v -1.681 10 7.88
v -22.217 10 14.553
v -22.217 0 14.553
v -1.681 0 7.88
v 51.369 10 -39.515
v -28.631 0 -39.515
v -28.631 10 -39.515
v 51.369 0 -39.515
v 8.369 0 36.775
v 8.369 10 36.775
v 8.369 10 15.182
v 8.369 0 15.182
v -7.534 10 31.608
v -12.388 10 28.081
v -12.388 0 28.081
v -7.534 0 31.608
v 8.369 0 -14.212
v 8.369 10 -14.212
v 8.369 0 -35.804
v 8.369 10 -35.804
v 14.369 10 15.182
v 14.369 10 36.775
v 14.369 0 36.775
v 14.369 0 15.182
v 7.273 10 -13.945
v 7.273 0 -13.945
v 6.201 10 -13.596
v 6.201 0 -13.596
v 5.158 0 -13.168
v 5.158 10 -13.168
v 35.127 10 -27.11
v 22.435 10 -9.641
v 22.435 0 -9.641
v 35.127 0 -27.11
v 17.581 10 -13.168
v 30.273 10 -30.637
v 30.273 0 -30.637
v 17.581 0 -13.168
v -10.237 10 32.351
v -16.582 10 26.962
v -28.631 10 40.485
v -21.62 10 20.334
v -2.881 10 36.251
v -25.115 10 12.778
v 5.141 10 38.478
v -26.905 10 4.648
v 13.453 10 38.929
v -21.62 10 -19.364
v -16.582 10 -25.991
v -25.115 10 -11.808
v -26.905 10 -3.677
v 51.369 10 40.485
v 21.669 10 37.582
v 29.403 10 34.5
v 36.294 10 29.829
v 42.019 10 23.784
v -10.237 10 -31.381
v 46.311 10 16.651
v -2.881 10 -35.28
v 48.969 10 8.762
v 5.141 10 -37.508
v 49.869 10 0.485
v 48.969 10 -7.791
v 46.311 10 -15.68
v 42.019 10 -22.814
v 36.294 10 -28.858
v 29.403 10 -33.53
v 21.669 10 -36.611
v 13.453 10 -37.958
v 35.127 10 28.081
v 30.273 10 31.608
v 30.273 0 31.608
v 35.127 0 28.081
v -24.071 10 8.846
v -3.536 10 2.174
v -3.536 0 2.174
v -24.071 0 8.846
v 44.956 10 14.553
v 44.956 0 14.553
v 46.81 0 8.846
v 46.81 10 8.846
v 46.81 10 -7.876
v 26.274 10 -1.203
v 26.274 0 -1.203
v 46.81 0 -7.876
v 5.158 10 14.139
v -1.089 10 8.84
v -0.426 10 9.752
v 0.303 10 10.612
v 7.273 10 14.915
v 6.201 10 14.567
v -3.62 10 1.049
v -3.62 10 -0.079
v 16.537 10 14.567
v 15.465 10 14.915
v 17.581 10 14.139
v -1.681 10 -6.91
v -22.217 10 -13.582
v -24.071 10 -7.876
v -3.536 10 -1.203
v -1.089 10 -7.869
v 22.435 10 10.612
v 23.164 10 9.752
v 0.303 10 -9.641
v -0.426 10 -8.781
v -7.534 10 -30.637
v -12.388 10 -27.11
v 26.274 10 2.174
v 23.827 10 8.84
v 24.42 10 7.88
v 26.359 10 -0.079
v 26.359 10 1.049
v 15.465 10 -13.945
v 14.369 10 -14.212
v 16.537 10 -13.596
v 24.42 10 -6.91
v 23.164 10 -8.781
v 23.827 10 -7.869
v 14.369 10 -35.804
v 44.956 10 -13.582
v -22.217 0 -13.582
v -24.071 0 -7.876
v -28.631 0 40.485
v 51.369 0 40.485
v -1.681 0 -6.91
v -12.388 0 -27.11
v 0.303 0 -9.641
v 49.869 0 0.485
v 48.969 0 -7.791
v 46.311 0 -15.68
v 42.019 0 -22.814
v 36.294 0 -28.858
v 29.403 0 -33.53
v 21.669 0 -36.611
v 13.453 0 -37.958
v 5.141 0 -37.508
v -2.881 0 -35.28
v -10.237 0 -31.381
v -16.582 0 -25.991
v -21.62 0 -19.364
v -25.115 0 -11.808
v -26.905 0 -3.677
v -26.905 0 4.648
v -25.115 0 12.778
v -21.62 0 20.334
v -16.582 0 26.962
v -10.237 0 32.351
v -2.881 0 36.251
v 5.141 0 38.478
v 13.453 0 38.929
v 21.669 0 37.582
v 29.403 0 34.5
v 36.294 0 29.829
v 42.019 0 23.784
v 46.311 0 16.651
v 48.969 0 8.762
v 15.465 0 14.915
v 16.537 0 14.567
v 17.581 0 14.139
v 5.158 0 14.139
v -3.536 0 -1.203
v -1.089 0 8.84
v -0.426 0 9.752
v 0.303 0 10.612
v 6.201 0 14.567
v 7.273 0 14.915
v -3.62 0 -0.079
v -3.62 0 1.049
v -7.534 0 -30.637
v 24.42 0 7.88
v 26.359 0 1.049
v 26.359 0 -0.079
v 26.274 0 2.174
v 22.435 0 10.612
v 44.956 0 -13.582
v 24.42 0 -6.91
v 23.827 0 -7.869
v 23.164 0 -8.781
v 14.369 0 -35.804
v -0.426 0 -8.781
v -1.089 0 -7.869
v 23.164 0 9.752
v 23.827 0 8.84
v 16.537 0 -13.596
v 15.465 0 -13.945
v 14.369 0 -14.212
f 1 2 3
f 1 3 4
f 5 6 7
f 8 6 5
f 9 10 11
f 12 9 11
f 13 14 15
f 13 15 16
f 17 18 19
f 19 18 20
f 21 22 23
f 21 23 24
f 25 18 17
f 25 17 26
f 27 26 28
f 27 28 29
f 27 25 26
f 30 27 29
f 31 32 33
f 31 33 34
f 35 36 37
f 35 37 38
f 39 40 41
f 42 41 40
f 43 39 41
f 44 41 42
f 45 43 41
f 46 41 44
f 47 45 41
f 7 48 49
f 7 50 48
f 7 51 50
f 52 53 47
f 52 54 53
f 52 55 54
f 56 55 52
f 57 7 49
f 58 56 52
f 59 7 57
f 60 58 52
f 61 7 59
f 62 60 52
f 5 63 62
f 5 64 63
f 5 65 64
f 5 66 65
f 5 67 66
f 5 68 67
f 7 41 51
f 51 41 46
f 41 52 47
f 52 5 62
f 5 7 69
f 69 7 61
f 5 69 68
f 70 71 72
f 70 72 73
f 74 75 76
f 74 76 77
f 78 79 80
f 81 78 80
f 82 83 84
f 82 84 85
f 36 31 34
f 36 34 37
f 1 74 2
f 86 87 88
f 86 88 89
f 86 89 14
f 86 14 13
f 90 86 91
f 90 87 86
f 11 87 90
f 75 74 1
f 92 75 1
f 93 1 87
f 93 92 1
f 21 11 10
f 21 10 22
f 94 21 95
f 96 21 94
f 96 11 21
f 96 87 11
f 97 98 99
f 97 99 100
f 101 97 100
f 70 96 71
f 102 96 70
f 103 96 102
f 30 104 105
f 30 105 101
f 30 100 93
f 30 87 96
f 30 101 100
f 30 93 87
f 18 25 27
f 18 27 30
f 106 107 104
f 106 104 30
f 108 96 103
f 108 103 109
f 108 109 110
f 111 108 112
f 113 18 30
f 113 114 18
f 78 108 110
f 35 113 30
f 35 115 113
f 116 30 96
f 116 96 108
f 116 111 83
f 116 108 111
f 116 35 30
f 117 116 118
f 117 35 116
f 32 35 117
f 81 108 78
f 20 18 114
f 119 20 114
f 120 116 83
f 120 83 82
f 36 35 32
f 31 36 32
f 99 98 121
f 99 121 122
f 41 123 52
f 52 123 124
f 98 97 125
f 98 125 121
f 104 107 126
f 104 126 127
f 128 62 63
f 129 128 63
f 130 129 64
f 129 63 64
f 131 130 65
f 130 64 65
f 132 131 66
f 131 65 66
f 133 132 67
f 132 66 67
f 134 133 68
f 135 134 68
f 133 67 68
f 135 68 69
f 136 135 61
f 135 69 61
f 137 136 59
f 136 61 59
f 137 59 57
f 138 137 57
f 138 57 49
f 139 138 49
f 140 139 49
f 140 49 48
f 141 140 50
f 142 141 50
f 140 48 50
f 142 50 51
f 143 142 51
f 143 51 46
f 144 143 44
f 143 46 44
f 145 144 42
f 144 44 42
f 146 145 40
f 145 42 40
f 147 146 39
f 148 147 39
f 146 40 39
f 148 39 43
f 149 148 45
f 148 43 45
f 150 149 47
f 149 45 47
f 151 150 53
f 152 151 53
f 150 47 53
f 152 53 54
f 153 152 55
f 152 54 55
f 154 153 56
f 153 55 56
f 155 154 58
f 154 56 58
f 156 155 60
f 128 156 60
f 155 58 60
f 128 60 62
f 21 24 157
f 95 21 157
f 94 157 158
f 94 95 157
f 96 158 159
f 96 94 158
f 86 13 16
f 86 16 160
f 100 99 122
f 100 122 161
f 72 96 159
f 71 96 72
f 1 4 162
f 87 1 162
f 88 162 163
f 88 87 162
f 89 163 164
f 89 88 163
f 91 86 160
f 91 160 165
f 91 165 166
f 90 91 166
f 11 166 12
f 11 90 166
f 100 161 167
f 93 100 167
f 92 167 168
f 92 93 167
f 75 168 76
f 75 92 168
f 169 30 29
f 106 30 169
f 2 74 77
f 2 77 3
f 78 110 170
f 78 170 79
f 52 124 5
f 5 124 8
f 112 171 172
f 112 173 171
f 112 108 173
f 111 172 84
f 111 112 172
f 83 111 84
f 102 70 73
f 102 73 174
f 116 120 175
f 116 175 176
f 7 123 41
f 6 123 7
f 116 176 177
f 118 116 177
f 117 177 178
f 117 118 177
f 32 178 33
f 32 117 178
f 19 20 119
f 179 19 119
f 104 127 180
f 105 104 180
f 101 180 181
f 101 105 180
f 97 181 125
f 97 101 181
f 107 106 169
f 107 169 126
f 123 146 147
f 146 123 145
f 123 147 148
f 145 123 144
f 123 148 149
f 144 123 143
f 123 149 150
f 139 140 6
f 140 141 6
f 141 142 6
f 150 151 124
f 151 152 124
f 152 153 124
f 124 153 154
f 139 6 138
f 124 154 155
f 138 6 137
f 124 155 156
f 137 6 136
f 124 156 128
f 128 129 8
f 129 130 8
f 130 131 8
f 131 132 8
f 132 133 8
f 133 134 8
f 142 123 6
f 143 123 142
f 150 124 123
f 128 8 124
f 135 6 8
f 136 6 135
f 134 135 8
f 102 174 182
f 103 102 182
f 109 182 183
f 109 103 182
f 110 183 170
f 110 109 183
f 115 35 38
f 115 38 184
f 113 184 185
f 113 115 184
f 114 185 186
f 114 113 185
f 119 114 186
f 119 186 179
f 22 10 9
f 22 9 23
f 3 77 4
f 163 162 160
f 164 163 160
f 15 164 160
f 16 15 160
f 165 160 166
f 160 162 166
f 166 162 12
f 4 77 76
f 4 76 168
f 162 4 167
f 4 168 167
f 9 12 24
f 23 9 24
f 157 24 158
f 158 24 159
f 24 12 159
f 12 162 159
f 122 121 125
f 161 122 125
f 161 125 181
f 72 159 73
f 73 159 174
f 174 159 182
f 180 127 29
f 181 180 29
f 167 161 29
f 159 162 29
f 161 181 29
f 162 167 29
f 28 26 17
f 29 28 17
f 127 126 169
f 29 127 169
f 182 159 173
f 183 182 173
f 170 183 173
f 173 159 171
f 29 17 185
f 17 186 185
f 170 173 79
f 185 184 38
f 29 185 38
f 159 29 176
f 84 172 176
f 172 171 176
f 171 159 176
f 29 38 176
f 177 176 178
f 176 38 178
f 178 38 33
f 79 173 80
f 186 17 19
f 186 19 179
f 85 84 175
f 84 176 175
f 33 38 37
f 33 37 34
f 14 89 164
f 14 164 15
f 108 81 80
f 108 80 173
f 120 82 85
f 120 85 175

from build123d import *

# Parameters (mm, degrees)
SKETCH1_W           = 80
SKETCH1_H           = 80
BOSS_EXTRUDE1_DEPTH = 10
SKETCH2_R           = 38.5
SKETCH2_R_2         = 15
CUT_EXTRUDE1_DEPTH  = 10
SKETCH3_W           = 6
SKETCH3_H           = 26.941084331
BOSS_EXTRUDE2_DEPTH = 10


with BuildPart() as part:
    # Sketch1 → Boss-Extrude1 (new body)
    with BuildSketch(Plane(origin=(0, 0, 0), x_dir=(1, 0, 0), z_dir=(0, 1, 0))):
        with Locations((11.36915078, -0.485268631)):
            Rectangle(SKETCH1_W, SKETCH1_H)
    extrude(amount=BOSS_EXTRUDE1_DEPTH)

    # Sketch2 → Cut-Extrude1 (cut)
    with BuildSketch(Plane(origin=(0, 10, 0), x_dir=(1, 0, 0), z_dir=(0, 1, 0))):
        with Locations((11.36915078, -0.485268631)):
            Circle(SKETCH2_R)
        with Locations((11.36915078, -0.485268631)):
            Circle(SKETCH2_R_2, mode=Mode.SUBTRACT)
    extrude(amount=-CUT_EXTRUDE1_DEPTH, mode=Mode.SUBTRACT)

    # Sketch3 → Boss-Extrude2 (add)
    with BuildSketch(Plane(origin=(0, 10, 0), x_dir=(1, 0, 0), z_dir=(0, 1, 0))):
        Polygon((-12.38846571, 27.11038033), (3.447106341, 5.314585258), (8.301208307, 8.841296772), (-7.534363744, 30.637091843), align=None)
        with Locations((11.36915078, 22.333914785)):
            Rectangle(SKETCH3_W, SKETCH3_H)
        Polygon((-24.071480193, 7.875703746), (1.551013617, -0.449549159), (3.405115583, 5.256789939), (-22.217378227, 13.582042844), align=None)
        Polygon((-22.217378227, -14.552580106), (3.405115583, -6.227327201), (1.551013617, -0.520988103), (-24.071480193, -8.846241008), align=None)
        Polygon((-7.534363744, -31.607629105), (8.301208307, -9.811834034), (3.447106341, -6.28512252), (-12.38846571, -28.080917591), align=None)
        with Locations((11.36915078, -23.304452047)):
            Rectangle(SKETCH3_W, SKETCH3_H)
        Polygon((35.12676727, -28.080917591), (19.291195219, -6.28512252), (14.437093253, -9.811834034), (30.272665304, -31.607629105), align=None)
        Polygon((46.809781753, -8.846241008), (21.187287943, -0.520988103), (19.333185977, -6.227327201), (44.955679786, -14.552580106), align=None)
        Polygon((44.955679786, 13.582042844), (19.333185977, 5.256789939), (21.187287943, -0.449549159), (46.809781753, 7.875703746), align=None)
        Polygon((30.272665304, 30.637091843), (14.437093253, 8.841296772), (19.291195219, 5.314585258), (35.12676727, 27.11038033), align=None)
    extrude(amount=-BOSS_EXTRUDE2_DEPTH)


solid = part.part
